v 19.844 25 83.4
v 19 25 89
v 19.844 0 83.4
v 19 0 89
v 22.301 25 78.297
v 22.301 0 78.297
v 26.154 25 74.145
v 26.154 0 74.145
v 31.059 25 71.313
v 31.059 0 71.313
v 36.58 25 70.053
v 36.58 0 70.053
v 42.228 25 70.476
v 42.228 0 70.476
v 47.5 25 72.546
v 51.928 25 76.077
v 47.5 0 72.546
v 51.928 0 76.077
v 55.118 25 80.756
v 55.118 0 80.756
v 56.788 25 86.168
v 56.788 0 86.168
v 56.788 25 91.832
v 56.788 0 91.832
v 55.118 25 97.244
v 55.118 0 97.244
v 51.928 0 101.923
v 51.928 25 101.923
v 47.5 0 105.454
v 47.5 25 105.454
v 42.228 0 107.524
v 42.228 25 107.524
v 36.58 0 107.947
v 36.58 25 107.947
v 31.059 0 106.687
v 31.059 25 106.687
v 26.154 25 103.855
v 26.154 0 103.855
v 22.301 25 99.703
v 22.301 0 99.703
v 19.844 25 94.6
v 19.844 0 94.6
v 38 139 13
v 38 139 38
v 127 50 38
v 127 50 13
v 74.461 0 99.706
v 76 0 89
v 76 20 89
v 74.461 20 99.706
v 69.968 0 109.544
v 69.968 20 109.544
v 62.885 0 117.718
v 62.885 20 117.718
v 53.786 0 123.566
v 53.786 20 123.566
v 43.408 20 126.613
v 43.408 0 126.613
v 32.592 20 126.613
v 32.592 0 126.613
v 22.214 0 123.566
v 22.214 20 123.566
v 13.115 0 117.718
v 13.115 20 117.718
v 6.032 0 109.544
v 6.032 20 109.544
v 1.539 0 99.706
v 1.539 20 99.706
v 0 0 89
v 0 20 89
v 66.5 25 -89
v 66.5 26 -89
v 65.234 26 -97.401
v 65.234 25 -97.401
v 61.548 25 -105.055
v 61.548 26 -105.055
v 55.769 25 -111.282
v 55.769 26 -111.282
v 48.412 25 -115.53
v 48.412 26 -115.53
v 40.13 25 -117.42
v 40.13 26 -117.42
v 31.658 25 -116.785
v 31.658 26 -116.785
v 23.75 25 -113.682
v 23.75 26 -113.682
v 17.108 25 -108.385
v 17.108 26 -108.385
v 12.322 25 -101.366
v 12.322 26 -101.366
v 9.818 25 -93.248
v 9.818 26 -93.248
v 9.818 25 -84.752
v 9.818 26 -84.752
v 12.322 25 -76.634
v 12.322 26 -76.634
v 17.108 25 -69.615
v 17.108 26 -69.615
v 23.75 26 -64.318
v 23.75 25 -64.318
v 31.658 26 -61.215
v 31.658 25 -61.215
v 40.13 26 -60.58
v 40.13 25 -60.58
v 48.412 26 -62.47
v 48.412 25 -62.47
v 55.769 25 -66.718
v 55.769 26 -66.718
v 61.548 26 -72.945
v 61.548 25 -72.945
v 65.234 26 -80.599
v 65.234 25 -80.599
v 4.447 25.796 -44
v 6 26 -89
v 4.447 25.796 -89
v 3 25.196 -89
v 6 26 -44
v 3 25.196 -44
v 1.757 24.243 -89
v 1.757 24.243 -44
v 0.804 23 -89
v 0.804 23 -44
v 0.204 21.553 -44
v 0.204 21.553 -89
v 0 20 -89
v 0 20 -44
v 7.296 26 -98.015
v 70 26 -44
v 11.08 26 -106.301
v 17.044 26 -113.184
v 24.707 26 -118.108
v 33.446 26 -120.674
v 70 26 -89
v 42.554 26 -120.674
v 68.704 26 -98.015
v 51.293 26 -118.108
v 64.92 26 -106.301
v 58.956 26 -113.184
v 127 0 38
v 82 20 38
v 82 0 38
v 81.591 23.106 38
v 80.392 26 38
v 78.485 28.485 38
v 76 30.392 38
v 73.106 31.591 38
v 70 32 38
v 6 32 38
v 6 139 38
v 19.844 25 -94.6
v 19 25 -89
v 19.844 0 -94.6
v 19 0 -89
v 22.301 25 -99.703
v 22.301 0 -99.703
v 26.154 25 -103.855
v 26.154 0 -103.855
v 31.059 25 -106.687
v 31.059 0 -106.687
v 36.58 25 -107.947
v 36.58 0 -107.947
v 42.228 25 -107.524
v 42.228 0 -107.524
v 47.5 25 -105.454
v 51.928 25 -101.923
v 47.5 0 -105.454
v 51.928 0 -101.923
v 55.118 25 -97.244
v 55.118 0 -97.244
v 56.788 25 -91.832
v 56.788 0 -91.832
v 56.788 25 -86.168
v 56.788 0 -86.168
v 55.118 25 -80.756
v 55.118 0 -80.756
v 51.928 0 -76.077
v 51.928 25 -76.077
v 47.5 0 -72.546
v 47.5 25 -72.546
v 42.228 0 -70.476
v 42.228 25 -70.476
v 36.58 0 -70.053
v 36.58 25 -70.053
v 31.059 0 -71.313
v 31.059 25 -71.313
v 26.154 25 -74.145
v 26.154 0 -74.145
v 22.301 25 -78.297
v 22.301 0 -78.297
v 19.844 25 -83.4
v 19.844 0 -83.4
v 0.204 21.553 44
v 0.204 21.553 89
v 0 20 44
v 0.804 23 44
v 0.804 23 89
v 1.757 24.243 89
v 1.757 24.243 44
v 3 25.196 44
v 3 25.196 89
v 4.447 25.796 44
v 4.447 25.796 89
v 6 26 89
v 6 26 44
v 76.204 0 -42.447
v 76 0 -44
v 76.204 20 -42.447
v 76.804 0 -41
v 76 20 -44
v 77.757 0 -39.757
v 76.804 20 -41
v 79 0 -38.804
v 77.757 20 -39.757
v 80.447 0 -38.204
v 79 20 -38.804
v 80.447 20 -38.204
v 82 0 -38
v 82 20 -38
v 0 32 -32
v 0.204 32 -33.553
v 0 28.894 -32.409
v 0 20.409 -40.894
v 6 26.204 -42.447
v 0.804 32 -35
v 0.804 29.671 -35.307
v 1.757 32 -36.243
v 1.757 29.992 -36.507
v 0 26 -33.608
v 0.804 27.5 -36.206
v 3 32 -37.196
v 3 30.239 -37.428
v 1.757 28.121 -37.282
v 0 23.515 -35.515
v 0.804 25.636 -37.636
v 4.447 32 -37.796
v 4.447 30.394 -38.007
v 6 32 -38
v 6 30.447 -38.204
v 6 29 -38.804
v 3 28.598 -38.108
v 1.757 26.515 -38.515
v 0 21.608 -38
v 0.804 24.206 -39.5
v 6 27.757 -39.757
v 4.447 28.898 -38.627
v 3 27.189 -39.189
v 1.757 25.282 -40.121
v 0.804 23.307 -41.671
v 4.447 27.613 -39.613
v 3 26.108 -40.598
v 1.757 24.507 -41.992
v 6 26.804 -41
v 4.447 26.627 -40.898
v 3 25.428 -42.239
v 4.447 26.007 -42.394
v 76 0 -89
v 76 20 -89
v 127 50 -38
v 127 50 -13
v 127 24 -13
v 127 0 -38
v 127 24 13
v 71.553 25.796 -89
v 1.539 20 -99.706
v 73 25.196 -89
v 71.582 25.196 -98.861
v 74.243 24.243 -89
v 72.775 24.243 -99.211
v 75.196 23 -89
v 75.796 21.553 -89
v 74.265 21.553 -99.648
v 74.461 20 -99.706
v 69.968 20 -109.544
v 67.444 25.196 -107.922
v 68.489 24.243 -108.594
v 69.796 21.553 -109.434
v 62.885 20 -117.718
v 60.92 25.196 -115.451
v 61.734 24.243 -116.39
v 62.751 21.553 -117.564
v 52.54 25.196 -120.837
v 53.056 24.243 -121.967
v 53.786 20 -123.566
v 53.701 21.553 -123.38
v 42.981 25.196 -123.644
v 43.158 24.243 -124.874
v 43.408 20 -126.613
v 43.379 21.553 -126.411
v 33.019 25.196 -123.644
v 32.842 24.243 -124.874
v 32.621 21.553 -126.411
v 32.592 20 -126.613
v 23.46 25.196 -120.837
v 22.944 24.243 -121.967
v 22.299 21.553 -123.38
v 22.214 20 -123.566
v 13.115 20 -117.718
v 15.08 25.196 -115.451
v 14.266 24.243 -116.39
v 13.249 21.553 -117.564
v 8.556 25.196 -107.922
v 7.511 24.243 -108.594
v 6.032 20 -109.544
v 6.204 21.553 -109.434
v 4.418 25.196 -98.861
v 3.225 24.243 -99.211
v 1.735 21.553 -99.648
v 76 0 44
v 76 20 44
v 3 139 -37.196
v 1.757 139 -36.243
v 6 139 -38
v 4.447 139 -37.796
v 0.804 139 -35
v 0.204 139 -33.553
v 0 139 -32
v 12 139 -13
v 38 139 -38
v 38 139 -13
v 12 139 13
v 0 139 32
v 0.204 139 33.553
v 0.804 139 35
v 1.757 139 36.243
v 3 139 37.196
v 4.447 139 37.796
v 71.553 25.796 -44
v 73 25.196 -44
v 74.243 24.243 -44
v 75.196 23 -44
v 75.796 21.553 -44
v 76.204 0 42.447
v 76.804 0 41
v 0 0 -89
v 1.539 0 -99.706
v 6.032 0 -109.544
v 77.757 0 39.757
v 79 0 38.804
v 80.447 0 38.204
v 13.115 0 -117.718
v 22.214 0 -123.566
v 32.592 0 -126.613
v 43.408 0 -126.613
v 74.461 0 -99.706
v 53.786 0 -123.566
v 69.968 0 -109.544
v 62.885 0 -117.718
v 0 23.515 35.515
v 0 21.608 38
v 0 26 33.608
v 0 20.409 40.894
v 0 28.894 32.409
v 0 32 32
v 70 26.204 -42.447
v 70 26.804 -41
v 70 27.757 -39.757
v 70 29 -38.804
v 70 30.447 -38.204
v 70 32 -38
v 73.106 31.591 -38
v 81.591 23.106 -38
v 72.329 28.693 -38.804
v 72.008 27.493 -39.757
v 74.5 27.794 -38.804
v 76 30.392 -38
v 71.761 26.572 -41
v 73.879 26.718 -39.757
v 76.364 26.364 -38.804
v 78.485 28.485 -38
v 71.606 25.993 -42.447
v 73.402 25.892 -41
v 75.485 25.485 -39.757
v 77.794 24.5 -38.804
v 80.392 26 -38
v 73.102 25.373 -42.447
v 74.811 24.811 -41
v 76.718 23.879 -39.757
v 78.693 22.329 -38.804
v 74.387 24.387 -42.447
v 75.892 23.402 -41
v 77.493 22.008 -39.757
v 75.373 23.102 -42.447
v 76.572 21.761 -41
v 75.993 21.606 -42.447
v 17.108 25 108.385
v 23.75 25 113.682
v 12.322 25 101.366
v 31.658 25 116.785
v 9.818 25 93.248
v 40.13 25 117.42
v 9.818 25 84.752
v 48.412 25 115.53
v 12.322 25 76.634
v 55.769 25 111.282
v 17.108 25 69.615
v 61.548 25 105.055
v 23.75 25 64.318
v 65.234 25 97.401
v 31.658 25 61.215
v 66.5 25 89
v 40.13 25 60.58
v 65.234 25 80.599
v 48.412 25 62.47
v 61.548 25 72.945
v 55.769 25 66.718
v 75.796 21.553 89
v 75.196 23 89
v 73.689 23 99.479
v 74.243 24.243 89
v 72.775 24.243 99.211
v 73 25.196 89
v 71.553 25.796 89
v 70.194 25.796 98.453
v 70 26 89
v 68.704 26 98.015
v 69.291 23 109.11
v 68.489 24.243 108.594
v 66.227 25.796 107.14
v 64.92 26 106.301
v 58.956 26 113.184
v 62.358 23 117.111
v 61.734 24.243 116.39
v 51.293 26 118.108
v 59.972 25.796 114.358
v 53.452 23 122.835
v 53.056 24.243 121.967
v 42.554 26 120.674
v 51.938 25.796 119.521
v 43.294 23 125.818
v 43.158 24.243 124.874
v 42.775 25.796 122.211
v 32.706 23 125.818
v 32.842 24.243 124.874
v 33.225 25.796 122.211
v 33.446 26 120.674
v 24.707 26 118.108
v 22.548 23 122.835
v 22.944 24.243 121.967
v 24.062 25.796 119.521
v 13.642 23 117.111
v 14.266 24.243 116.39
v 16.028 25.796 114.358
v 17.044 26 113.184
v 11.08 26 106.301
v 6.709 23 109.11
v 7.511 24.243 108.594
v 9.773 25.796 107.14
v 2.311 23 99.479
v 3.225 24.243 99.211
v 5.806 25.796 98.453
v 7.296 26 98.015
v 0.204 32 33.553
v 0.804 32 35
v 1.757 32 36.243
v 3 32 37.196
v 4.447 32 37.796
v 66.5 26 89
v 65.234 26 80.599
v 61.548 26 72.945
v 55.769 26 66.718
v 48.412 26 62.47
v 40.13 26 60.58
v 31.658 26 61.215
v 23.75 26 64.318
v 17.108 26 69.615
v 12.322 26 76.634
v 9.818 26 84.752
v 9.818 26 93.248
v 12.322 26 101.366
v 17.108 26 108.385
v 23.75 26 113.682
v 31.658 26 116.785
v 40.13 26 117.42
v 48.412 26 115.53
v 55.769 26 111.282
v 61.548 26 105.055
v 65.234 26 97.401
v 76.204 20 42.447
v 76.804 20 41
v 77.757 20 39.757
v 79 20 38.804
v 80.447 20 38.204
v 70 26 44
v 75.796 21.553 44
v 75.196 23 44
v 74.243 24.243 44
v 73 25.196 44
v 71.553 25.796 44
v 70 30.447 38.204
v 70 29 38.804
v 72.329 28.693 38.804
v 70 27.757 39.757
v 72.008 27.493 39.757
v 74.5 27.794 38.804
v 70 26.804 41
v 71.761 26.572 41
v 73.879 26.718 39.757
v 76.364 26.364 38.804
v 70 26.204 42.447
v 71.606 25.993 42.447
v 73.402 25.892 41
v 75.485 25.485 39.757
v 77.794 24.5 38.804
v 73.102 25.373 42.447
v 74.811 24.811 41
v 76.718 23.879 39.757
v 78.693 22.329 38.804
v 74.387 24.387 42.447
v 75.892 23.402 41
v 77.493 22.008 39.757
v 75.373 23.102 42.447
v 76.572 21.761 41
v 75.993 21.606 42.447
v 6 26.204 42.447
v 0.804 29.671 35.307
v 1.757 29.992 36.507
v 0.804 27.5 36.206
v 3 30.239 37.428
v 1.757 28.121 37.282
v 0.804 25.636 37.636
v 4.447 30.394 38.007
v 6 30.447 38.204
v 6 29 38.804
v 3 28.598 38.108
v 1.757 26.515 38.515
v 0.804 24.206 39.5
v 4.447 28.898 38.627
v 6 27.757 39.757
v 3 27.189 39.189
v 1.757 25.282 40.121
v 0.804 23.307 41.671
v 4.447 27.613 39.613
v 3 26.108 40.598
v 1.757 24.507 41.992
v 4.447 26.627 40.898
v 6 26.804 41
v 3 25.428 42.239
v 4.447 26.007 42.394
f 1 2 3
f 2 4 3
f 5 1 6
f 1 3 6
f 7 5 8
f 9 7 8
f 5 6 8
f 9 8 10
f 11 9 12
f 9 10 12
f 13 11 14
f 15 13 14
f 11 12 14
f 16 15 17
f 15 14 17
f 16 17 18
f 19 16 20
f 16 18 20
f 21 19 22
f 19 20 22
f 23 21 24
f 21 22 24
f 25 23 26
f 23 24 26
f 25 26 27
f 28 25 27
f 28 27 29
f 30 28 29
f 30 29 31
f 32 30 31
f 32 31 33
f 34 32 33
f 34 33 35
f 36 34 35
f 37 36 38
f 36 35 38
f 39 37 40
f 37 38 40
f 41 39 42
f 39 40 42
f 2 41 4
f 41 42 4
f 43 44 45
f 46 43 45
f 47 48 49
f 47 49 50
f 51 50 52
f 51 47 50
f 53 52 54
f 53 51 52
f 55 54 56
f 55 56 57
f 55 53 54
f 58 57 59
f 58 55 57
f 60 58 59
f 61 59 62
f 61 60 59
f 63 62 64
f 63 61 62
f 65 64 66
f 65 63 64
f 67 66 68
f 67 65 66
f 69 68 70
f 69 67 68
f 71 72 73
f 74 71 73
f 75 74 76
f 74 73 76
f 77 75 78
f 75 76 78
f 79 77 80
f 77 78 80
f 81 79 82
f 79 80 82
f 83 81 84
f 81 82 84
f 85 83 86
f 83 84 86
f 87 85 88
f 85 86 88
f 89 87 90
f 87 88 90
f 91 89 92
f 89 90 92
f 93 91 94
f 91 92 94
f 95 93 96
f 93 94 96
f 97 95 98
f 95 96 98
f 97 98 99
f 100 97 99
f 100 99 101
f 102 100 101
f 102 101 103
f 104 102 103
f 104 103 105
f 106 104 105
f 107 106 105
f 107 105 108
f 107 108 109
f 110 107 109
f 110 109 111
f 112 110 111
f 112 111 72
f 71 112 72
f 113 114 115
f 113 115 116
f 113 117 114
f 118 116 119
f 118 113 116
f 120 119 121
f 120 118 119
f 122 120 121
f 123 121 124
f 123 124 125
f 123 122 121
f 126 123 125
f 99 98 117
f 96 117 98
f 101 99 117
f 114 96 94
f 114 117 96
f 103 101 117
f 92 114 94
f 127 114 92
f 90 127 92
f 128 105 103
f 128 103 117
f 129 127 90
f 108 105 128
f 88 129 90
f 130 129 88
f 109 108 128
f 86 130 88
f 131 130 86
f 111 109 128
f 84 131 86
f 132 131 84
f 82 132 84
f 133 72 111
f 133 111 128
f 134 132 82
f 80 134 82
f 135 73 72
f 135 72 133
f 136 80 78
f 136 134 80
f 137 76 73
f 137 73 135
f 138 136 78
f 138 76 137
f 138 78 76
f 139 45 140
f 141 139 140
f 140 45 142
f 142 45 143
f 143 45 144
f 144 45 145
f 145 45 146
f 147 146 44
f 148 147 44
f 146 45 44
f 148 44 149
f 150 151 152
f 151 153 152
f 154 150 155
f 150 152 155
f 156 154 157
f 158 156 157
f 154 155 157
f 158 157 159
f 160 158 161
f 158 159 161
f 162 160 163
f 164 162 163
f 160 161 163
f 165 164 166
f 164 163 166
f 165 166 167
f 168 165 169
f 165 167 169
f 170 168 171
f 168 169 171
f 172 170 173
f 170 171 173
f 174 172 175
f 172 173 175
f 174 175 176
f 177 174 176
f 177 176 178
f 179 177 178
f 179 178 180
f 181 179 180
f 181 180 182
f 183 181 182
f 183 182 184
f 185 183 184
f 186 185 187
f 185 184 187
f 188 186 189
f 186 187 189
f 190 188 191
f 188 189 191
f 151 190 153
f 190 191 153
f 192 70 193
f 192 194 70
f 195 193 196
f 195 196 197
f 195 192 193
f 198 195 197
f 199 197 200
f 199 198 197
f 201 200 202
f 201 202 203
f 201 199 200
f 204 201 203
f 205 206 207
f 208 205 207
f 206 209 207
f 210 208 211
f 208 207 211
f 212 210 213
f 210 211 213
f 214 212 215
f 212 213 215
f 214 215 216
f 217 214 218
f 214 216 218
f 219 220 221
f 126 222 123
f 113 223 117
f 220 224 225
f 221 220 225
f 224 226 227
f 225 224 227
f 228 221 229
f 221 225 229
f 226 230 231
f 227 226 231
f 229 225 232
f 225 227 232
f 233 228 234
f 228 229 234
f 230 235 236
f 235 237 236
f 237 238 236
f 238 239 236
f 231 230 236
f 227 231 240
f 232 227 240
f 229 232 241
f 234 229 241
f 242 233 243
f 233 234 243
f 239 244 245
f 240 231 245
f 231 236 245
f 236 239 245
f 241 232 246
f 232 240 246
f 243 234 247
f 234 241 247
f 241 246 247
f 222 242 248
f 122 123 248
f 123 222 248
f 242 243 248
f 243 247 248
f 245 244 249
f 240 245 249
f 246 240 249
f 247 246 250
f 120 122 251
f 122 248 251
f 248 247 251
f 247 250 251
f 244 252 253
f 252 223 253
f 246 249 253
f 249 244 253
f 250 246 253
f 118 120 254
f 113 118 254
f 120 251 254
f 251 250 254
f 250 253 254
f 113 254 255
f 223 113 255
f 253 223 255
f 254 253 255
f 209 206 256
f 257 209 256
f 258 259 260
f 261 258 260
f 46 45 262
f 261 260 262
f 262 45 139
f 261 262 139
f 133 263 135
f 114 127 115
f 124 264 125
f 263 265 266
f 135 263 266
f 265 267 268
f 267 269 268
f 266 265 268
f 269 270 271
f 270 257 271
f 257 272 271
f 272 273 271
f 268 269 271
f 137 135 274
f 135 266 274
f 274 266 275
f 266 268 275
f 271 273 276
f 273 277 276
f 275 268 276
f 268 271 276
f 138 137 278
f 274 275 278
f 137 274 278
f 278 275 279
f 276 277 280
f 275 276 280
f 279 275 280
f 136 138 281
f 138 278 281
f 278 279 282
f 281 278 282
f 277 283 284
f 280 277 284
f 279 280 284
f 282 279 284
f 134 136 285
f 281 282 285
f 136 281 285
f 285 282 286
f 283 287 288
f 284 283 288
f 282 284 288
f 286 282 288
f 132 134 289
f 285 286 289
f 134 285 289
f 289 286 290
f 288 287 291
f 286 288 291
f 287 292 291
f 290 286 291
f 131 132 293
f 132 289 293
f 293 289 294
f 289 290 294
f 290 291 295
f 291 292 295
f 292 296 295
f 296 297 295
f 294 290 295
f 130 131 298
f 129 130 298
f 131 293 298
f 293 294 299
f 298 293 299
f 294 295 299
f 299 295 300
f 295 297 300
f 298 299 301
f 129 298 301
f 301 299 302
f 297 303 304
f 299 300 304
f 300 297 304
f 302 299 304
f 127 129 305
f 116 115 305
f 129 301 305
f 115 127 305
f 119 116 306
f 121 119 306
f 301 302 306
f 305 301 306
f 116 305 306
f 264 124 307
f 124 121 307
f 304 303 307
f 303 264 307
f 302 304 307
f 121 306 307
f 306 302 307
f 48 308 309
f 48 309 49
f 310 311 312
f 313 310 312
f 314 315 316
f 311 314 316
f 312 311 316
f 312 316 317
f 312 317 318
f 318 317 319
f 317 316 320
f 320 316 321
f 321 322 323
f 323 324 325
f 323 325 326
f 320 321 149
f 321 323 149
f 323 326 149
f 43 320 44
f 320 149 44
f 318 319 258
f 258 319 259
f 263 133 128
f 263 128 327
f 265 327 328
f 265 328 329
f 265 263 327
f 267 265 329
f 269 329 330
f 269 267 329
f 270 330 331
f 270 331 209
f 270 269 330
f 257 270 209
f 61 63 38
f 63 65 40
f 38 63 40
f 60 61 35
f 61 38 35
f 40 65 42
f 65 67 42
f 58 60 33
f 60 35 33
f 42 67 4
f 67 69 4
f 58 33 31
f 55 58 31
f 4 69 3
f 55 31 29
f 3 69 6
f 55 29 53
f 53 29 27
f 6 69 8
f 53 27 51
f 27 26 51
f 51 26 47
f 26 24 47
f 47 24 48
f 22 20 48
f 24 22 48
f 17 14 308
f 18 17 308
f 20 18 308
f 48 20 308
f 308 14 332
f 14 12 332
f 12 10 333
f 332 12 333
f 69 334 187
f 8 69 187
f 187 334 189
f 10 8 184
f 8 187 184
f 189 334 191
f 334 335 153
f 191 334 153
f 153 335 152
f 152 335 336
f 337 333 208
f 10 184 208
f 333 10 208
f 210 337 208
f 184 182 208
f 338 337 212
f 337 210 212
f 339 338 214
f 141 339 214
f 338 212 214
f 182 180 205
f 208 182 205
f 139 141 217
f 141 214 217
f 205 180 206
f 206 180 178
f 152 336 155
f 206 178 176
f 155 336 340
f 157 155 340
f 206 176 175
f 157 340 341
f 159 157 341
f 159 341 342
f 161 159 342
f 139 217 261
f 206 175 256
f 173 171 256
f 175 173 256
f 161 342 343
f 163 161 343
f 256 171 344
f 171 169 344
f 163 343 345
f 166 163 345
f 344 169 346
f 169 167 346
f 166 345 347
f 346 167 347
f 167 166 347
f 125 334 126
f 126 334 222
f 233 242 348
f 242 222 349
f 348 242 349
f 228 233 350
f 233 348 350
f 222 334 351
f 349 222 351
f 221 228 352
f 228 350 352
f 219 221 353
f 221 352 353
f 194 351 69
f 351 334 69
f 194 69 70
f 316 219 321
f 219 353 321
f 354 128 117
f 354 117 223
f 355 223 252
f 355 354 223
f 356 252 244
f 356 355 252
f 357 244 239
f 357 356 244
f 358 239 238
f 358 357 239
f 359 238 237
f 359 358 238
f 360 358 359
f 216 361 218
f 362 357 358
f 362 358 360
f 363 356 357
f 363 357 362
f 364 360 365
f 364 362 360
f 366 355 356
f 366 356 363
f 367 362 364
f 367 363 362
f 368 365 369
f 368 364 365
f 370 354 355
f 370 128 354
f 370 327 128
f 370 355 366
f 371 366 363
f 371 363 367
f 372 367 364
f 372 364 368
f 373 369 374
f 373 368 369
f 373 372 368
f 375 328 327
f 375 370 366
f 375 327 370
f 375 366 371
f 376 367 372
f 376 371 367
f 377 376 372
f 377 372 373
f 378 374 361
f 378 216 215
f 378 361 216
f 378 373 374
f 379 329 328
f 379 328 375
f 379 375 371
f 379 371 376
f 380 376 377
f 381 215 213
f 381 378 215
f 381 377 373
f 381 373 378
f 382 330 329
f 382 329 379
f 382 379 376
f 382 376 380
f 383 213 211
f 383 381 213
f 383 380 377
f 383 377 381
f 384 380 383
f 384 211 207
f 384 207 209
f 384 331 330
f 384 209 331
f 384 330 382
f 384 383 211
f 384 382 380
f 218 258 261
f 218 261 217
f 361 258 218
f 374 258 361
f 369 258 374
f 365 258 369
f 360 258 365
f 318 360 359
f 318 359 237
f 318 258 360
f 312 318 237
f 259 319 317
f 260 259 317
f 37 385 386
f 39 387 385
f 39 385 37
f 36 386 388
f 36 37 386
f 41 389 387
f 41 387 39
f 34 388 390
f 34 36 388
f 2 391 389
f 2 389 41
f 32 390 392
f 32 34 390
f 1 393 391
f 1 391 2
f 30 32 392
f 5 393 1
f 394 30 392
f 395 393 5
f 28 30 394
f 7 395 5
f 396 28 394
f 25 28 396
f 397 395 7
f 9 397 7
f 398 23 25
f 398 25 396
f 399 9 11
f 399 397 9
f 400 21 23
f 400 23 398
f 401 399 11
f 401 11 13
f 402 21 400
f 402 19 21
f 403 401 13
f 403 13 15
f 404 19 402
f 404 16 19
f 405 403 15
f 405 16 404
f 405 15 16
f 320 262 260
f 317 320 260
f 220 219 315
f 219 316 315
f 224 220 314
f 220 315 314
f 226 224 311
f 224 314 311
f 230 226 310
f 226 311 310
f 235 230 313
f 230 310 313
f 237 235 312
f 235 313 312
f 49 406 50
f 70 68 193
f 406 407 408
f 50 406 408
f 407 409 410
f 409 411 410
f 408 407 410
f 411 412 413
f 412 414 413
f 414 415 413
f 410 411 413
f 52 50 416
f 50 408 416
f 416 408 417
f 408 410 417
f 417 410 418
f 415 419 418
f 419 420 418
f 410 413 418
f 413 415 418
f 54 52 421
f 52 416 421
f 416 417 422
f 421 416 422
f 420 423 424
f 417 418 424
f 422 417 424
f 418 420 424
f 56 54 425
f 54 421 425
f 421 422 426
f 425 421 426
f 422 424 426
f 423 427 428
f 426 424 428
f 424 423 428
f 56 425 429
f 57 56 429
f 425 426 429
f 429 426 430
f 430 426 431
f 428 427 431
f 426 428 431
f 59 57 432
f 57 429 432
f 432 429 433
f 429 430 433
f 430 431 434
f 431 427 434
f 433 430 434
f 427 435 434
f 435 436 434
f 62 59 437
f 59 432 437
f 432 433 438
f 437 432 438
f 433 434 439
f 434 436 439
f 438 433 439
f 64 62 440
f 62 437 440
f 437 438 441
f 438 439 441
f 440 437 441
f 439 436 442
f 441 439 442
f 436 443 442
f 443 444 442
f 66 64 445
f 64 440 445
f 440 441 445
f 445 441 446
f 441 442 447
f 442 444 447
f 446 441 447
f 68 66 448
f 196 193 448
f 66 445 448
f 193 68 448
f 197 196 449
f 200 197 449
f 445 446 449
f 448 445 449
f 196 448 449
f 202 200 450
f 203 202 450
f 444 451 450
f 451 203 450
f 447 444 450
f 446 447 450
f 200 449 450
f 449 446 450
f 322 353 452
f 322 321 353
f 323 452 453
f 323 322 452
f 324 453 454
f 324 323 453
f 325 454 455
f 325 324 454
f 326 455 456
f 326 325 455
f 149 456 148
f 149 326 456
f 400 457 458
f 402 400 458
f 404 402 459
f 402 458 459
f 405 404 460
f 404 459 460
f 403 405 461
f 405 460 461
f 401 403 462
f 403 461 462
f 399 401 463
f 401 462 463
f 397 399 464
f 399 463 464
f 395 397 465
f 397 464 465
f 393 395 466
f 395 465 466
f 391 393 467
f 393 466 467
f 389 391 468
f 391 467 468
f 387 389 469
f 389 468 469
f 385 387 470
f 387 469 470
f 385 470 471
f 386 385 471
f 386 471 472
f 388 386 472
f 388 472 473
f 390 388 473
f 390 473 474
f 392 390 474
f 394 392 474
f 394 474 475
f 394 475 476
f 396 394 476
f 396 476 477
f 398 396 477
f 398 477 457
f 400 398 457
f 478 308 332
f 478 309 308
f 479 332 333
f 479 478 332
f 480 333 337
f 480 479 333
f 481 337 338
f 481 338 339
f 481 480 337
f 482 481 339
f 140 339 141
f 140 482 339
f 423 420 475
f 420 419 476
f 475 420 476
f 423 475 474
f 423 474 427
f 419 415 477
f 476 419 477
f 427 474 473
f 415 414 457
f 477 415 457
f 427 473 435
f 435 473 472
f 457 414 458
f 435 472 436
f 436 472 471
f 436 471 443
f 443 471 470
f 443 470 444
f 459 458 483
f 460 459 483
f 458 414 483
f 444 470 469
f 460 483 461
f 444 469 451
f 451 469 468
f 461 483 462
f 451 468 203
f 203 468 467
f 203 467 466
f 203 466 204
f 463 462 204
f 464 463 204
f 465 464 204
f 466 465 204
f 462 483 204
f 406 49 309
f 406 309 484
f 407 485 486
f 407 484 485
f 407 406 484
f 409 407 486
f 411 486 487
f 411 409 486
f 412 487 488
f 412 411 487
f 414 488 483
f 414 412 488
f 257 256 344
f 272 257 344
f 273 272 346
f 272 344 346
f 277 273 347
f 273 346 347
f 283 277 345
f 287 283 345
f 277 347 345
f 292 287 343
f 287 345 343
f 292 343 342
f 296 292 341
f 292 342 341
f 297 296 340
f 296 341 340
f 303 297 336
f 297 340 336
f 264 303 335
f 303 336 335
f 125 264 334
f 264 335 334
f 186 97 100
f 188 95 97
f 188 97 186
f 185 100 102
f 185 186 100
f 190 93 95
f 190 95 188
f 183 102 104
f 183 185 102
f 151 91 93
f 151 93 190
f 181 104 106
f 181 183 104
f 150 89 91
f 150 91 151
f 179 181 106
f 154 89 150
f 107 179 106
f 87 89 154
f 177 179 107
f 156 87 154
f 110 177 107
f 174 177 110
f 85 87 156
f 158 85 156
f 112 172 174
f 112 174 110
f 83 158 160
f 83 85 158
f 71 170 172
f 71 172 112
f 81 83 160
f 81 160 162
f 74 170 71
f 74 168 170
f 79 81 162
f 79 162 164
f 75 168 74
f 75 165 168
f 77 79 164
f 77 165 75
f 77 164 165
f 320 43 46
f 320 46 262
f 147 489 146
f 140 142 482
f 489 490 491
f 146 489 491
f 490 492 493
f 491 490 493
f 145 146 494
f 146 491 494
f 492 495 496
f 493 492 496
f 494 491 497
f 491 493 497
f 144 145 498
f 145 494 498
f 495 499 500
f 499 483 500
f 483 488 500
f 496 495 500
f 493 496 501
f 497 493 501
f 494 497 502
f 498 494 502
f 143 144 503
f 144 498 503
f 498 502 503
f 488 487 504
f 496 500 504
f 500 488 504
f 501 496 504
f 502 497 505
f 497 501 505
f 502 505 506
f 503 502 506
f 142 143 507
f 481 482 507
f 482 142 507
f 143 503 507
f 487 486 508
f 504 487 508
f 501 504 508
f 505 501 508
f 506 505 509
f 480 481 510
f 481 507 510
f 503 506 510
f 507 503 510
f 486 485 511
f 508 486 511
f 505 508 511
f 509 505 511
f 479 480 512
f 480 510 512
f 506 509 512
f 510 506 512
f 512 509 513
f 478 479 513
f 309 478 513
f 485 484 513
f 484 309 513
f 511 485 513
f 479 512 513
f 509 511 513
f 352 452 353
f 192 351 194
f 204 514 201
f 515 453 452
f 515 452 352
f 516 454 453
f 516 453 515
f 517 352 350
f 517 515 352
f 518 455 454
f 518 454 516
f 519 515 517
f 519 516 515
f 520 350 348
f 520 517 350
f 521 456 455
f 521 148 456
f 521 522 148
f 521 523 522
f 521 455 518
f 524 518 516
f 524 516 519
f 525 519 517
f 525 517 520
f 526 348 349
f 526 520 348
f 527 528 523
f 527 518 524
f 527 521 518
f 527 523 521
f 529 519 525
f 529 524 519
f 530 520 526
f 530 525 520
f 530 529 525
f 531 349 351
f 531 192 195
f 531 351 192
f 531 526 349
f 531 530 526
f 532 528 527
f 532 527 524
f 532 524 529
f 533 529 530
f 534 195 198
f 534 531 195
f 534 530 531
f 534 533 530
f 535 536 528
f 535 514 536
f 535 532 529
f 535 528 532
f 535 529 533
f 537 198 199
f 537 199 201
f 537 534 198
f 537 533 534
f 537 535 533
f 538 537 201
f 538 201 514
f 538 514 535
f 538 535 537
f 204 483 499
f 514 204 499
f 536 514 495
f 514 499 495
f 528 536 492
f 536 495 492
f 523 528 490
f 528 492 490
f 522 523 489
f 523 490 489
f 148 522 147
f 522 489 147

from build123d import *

# Parameters (mm, degrees)
BOSS_EXTRUDE1_DEPTH                      = 38
BOSS_EXTRUDE3_DEPTH                      = 26
FILLET1_R                                = 6
CBORE_FOR_M30_HEX_HEAD_BOLT2_D           = 38
CBORE_FOR_M30_HEX_HEAD_BOLT2_CBORE_D     = 57
CBORE_FOR_M30_HEX_HEAD_BOLT2_CBORE_DEPTH = 1
SKETCH17_W                               = 26
SKETCH17_H                               = 18.384776311
CUT_EXTRUDE3_DEPTH                       = 180.605122421


with BuildPart() as part:
    # Sketch1 → Boss-Extrude1 (new body, symmetric)
    with BuildSketch(Plane.XY):
        Polygon((38, 139), (127, 50), (127, 0), (0, 0), (0, 139), align=None)
    extrude(amount=BOSS_EXTRUDE1_DEPTH, both=True)

    # Sketch3 → Boss-Extrude3 (add)
    with BuildSketch(Plane(origin=(0, 0, 0), x_dir=(1, 0, 0), z_dir=(0, 1, 0))):
        with BuildLine():
            Line((0, 38), (76, 38))
            Line((76, 38), (76, 89))
            ThreePointArc((76, 89), (38, 127), (0, 89))
            Line((0, 89), (0, 38))
        make_face()
        with BuildLine():
            Line((0, -38), (76, -38))
            Line((76, -38), (76, -89))
            ThreePointArc((76, -89), (38, -127), (0, -89))
            Line((0, -89), (0, -38))
        make_face()
    extrude(amount=BOSS_EXTRUDE3_DEPTH)

    # Fillet1
    fillet1_edges = [part.edges().sort_by_distance(p)[0] for p in [
        (76, 13, -38),
        (0, 26, -63.5),
        (38, 26, -38),
        (76, 26, -63.5),
        (38, 26, -127),
        (76, 13, 38),
        (0, 26, 63.5),
        (38, 26, 127),
        (76, 26, 63.5),
        (38, 26, 38),
        (0, 82.5, 38),
        (0, 82.5, -38),
    ]]
    fillet(fillet1_edges, radius=FILLET1_R)

    # CBORE for M30 Hex Head Bolt2 (through all)
    with Locations(Plane(origin=(0, 26, 0), x_dir=(1, 0, 0), z_dir=(0, 1, 0))):
        with Locations((38, -89), (38, 89)):
            CounterBoreHole(CBORE_FOR_M30_HEX_HEAD_BOLT2_D / 2, CBORE_FOR_M30_HEX_HEAD_BOLT2_CBORE_D / 2, CBORE_FOR_M30_HEX_HEAD_BOLT2_CBORE_DEPTH)

    # Sketch17 → Cut-Extrude3 (cut, through all)
    with BuildSketch(Plane(origin=(-63.5, 63.5, 0), x_dir=(0, 0, -1), z_dir=(-0.707106781, 0.707106781, 0))):
        with Locations((0, -115.965512115)):
            Rectangle(SKETCH17_W, SKETCH17_H)
    extrude(amount=-CUT_EXTRUDE3_DEPTH, mode=Mode.SUBTRACT)


solid = part.part
